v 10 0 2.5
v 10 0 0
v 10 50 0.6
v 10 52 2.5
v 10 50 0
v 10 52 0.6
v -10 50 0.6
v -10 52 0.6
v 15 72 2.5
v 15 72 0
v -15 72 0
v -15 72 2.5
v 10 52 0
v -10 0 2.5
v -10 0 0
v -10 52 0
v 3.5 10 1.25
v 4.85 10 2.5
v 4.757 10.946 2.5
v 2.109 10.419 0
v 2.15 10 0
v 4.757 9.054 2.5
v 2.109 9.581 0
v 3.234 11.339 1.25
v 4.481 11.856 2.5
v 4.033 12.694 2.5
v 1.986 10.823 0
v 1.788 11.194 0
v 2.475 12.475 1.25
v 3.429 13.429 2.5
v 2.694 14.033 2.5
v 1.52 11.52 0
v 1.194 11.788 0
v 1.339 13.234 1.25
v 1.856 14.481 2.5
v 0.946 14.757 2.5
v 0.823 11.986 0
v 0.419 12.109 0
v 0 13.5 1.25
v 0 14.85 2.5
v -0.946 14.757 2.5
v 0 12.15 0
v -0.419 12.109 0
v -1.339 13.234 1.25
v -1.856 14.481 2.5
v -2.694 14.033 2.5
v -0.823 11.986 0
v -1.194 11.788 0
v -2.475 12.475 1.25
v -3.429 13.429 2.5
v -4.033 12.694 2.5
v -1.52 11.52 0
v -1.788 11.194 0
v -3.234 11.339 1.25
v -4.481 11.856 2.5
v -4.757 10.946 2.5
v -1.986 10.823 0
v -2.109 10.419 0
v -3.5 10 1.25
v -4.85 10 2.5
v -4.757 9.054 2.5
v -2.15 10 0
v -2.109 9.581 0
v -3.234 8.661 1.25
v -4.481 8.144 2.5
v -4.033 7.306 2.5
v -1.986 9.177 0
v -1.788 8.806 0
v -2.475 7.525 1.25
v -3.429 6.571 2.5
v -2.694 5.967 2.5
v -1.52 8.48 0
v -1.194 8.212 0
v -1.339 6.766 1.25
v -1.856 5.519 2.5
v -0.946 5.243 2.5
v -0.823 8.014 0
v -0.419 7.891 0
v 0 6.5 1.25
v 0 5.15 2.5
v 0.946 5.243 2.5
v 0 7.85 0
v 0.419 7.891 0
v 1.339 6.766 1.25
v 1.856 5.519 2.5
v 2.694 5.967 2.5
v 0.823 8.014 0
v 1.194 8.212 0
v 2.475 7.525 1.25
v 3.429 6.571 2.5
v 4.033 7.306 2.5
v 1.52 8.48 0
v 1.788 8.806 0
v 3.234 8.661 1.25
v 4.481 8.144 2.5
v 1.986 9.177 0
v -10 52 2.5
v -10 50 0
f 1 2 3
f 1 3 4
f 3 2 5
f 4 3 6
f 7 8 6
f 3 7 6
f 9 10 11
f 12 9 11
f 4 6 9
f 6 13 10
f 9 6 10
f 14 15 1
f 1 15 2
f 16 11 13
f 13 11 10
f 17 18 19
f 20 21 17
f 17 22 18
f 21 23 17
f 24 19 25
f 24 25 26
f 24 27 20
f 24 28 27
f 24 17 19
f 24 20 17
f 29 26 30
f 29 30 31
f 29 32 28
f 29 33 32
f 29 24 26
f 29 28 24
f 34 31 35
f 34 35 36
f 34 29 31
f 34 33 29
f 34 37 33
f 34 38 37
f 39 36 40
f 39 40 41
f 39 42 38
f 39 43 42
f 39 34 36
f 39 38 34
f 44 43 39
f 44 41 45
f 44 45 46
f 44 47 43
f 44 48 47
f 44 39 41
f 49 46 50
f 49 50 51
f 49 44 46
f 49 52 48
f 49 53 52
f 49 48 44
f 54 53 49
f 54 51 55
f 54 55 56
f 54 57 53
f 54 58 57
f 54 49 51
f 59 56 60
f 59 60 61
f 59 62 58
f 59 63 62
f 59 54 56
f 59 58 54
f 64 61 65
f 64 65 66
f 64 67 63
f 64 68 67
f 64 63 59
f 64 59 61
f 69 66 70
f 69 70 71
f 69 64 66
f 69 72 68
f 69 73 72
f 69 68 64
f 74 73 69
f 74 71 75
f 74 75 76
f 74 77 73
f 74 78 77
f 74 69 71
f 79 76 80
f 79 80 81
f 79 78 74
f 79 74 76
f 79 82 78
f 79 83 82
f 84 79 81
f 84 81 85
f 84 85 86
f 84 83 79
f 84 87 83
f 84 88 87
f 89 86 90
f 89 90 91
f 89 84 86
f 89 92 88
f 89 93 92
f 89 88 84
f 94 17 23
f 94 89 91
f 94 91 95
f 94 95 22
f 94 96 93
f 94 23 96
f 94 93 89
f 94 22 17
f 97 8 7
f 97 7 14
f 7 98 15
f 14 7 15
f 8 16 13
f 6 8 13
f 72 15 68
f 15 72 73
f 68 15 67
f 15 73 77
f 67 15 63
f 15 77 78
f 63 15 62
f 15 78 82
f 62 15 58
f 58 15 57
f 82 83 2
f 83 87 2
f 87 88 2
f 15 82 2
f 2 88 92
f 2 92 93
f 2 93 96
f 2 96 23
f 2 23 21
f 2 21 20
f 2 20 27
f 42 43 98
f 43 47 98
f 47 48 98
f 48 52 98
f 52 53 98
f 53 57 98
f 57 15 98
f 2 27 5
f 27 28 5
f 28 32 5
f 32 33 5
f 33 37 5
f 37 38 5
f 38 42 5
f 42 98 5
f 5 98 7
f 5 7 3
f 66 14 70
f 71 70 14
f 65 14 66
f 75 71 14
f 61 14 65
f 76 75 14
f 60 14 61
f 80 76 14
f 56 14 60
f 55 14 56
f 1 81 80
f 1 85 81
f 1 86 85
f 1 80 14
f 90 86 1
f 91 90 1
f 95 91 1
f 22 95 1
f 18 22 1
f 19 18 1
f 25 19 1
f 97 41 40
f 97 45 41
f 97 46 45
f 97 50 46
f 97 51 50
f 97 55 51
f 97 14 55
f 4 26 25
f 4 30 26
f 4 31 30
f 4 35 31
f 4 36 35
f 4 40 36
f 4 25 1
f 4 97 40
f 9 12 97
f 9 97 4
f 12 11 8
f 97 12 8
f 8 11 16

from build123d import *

# Parameters (mm, degrees)
DODANIE_WYCI_GNI_CIE1_DEPTH = 2.5
SZKIC2_W                    = 20
SZKIC2_H                    = 2
WYTNIJ_WYCI_GNI_CIE1_DEPTH  = 0.6
SZKIC3_R                    = 2.15
WYTNIJ_WYCI_GNI_CIE2_DEPTH  = 74.588382235
SFAZOWANIE1_SIZE2           = 2.5
SFAZOWANIE1_SIZE            = 2.7


with BuildPart() as part:
    # Szkic1 → Dodanie-wyciągnięcie1 (new body)
    with BuildSketch(Plane.XY):
        Polygon((-10, 0), (10, 0), (10, 50), (10, 52), (15, 72), (-15, 72), (-10, 52), (-10, 50), align=None)
    extrude(amount=DODANIE_WYCI_GNI_CIE1_DEPTH)

    # Szkic2 → Wytnij-wyciągnięcie1 (cut)
    with BuildSketch(Plane.XY):
        with Locations((0, 51)):
            Rectangle(SZKIC2_W, SZKIC2_H)
    extrude(amount=WYTNIJ_WYCI_GNI_CIE1_DEPTH, mode=Mode.SUBTRACT)

    # Szkic3 → Wytnij-wyciągnięcie2 (cut, through all)
    with BuildSketch(Plane.XY.offset(2.5)):
        with Locations((0, 10)):
            Circle(SZKIC3_R)
    extrude(amount=-WYTNIJ_WYCI_GNI_CIE2_DEPTH, mode=Mode.SUBTRACT)

    # Sfazowanie1
    sfazowanie1_edges = [part.edges().sort_by_distance(p)[0] for p in [
        (-2.15, 10, 2.5),
    ]]
    sfazowanie1_side = [part.faces().sort_by_distance(p)[0] for p in [
        (-2.2, 10, 2.5),
    ]]
    chamfer(sfazowanie1_edges, length=SFAZOWANIE1_SIZE - 0.0001, length2=SFAZOWANIE1_SIZE2 - 0.0001, reference=sfazowanie1_side[0])  # a hair under: the kernel refuses the full size


solid = part.part
